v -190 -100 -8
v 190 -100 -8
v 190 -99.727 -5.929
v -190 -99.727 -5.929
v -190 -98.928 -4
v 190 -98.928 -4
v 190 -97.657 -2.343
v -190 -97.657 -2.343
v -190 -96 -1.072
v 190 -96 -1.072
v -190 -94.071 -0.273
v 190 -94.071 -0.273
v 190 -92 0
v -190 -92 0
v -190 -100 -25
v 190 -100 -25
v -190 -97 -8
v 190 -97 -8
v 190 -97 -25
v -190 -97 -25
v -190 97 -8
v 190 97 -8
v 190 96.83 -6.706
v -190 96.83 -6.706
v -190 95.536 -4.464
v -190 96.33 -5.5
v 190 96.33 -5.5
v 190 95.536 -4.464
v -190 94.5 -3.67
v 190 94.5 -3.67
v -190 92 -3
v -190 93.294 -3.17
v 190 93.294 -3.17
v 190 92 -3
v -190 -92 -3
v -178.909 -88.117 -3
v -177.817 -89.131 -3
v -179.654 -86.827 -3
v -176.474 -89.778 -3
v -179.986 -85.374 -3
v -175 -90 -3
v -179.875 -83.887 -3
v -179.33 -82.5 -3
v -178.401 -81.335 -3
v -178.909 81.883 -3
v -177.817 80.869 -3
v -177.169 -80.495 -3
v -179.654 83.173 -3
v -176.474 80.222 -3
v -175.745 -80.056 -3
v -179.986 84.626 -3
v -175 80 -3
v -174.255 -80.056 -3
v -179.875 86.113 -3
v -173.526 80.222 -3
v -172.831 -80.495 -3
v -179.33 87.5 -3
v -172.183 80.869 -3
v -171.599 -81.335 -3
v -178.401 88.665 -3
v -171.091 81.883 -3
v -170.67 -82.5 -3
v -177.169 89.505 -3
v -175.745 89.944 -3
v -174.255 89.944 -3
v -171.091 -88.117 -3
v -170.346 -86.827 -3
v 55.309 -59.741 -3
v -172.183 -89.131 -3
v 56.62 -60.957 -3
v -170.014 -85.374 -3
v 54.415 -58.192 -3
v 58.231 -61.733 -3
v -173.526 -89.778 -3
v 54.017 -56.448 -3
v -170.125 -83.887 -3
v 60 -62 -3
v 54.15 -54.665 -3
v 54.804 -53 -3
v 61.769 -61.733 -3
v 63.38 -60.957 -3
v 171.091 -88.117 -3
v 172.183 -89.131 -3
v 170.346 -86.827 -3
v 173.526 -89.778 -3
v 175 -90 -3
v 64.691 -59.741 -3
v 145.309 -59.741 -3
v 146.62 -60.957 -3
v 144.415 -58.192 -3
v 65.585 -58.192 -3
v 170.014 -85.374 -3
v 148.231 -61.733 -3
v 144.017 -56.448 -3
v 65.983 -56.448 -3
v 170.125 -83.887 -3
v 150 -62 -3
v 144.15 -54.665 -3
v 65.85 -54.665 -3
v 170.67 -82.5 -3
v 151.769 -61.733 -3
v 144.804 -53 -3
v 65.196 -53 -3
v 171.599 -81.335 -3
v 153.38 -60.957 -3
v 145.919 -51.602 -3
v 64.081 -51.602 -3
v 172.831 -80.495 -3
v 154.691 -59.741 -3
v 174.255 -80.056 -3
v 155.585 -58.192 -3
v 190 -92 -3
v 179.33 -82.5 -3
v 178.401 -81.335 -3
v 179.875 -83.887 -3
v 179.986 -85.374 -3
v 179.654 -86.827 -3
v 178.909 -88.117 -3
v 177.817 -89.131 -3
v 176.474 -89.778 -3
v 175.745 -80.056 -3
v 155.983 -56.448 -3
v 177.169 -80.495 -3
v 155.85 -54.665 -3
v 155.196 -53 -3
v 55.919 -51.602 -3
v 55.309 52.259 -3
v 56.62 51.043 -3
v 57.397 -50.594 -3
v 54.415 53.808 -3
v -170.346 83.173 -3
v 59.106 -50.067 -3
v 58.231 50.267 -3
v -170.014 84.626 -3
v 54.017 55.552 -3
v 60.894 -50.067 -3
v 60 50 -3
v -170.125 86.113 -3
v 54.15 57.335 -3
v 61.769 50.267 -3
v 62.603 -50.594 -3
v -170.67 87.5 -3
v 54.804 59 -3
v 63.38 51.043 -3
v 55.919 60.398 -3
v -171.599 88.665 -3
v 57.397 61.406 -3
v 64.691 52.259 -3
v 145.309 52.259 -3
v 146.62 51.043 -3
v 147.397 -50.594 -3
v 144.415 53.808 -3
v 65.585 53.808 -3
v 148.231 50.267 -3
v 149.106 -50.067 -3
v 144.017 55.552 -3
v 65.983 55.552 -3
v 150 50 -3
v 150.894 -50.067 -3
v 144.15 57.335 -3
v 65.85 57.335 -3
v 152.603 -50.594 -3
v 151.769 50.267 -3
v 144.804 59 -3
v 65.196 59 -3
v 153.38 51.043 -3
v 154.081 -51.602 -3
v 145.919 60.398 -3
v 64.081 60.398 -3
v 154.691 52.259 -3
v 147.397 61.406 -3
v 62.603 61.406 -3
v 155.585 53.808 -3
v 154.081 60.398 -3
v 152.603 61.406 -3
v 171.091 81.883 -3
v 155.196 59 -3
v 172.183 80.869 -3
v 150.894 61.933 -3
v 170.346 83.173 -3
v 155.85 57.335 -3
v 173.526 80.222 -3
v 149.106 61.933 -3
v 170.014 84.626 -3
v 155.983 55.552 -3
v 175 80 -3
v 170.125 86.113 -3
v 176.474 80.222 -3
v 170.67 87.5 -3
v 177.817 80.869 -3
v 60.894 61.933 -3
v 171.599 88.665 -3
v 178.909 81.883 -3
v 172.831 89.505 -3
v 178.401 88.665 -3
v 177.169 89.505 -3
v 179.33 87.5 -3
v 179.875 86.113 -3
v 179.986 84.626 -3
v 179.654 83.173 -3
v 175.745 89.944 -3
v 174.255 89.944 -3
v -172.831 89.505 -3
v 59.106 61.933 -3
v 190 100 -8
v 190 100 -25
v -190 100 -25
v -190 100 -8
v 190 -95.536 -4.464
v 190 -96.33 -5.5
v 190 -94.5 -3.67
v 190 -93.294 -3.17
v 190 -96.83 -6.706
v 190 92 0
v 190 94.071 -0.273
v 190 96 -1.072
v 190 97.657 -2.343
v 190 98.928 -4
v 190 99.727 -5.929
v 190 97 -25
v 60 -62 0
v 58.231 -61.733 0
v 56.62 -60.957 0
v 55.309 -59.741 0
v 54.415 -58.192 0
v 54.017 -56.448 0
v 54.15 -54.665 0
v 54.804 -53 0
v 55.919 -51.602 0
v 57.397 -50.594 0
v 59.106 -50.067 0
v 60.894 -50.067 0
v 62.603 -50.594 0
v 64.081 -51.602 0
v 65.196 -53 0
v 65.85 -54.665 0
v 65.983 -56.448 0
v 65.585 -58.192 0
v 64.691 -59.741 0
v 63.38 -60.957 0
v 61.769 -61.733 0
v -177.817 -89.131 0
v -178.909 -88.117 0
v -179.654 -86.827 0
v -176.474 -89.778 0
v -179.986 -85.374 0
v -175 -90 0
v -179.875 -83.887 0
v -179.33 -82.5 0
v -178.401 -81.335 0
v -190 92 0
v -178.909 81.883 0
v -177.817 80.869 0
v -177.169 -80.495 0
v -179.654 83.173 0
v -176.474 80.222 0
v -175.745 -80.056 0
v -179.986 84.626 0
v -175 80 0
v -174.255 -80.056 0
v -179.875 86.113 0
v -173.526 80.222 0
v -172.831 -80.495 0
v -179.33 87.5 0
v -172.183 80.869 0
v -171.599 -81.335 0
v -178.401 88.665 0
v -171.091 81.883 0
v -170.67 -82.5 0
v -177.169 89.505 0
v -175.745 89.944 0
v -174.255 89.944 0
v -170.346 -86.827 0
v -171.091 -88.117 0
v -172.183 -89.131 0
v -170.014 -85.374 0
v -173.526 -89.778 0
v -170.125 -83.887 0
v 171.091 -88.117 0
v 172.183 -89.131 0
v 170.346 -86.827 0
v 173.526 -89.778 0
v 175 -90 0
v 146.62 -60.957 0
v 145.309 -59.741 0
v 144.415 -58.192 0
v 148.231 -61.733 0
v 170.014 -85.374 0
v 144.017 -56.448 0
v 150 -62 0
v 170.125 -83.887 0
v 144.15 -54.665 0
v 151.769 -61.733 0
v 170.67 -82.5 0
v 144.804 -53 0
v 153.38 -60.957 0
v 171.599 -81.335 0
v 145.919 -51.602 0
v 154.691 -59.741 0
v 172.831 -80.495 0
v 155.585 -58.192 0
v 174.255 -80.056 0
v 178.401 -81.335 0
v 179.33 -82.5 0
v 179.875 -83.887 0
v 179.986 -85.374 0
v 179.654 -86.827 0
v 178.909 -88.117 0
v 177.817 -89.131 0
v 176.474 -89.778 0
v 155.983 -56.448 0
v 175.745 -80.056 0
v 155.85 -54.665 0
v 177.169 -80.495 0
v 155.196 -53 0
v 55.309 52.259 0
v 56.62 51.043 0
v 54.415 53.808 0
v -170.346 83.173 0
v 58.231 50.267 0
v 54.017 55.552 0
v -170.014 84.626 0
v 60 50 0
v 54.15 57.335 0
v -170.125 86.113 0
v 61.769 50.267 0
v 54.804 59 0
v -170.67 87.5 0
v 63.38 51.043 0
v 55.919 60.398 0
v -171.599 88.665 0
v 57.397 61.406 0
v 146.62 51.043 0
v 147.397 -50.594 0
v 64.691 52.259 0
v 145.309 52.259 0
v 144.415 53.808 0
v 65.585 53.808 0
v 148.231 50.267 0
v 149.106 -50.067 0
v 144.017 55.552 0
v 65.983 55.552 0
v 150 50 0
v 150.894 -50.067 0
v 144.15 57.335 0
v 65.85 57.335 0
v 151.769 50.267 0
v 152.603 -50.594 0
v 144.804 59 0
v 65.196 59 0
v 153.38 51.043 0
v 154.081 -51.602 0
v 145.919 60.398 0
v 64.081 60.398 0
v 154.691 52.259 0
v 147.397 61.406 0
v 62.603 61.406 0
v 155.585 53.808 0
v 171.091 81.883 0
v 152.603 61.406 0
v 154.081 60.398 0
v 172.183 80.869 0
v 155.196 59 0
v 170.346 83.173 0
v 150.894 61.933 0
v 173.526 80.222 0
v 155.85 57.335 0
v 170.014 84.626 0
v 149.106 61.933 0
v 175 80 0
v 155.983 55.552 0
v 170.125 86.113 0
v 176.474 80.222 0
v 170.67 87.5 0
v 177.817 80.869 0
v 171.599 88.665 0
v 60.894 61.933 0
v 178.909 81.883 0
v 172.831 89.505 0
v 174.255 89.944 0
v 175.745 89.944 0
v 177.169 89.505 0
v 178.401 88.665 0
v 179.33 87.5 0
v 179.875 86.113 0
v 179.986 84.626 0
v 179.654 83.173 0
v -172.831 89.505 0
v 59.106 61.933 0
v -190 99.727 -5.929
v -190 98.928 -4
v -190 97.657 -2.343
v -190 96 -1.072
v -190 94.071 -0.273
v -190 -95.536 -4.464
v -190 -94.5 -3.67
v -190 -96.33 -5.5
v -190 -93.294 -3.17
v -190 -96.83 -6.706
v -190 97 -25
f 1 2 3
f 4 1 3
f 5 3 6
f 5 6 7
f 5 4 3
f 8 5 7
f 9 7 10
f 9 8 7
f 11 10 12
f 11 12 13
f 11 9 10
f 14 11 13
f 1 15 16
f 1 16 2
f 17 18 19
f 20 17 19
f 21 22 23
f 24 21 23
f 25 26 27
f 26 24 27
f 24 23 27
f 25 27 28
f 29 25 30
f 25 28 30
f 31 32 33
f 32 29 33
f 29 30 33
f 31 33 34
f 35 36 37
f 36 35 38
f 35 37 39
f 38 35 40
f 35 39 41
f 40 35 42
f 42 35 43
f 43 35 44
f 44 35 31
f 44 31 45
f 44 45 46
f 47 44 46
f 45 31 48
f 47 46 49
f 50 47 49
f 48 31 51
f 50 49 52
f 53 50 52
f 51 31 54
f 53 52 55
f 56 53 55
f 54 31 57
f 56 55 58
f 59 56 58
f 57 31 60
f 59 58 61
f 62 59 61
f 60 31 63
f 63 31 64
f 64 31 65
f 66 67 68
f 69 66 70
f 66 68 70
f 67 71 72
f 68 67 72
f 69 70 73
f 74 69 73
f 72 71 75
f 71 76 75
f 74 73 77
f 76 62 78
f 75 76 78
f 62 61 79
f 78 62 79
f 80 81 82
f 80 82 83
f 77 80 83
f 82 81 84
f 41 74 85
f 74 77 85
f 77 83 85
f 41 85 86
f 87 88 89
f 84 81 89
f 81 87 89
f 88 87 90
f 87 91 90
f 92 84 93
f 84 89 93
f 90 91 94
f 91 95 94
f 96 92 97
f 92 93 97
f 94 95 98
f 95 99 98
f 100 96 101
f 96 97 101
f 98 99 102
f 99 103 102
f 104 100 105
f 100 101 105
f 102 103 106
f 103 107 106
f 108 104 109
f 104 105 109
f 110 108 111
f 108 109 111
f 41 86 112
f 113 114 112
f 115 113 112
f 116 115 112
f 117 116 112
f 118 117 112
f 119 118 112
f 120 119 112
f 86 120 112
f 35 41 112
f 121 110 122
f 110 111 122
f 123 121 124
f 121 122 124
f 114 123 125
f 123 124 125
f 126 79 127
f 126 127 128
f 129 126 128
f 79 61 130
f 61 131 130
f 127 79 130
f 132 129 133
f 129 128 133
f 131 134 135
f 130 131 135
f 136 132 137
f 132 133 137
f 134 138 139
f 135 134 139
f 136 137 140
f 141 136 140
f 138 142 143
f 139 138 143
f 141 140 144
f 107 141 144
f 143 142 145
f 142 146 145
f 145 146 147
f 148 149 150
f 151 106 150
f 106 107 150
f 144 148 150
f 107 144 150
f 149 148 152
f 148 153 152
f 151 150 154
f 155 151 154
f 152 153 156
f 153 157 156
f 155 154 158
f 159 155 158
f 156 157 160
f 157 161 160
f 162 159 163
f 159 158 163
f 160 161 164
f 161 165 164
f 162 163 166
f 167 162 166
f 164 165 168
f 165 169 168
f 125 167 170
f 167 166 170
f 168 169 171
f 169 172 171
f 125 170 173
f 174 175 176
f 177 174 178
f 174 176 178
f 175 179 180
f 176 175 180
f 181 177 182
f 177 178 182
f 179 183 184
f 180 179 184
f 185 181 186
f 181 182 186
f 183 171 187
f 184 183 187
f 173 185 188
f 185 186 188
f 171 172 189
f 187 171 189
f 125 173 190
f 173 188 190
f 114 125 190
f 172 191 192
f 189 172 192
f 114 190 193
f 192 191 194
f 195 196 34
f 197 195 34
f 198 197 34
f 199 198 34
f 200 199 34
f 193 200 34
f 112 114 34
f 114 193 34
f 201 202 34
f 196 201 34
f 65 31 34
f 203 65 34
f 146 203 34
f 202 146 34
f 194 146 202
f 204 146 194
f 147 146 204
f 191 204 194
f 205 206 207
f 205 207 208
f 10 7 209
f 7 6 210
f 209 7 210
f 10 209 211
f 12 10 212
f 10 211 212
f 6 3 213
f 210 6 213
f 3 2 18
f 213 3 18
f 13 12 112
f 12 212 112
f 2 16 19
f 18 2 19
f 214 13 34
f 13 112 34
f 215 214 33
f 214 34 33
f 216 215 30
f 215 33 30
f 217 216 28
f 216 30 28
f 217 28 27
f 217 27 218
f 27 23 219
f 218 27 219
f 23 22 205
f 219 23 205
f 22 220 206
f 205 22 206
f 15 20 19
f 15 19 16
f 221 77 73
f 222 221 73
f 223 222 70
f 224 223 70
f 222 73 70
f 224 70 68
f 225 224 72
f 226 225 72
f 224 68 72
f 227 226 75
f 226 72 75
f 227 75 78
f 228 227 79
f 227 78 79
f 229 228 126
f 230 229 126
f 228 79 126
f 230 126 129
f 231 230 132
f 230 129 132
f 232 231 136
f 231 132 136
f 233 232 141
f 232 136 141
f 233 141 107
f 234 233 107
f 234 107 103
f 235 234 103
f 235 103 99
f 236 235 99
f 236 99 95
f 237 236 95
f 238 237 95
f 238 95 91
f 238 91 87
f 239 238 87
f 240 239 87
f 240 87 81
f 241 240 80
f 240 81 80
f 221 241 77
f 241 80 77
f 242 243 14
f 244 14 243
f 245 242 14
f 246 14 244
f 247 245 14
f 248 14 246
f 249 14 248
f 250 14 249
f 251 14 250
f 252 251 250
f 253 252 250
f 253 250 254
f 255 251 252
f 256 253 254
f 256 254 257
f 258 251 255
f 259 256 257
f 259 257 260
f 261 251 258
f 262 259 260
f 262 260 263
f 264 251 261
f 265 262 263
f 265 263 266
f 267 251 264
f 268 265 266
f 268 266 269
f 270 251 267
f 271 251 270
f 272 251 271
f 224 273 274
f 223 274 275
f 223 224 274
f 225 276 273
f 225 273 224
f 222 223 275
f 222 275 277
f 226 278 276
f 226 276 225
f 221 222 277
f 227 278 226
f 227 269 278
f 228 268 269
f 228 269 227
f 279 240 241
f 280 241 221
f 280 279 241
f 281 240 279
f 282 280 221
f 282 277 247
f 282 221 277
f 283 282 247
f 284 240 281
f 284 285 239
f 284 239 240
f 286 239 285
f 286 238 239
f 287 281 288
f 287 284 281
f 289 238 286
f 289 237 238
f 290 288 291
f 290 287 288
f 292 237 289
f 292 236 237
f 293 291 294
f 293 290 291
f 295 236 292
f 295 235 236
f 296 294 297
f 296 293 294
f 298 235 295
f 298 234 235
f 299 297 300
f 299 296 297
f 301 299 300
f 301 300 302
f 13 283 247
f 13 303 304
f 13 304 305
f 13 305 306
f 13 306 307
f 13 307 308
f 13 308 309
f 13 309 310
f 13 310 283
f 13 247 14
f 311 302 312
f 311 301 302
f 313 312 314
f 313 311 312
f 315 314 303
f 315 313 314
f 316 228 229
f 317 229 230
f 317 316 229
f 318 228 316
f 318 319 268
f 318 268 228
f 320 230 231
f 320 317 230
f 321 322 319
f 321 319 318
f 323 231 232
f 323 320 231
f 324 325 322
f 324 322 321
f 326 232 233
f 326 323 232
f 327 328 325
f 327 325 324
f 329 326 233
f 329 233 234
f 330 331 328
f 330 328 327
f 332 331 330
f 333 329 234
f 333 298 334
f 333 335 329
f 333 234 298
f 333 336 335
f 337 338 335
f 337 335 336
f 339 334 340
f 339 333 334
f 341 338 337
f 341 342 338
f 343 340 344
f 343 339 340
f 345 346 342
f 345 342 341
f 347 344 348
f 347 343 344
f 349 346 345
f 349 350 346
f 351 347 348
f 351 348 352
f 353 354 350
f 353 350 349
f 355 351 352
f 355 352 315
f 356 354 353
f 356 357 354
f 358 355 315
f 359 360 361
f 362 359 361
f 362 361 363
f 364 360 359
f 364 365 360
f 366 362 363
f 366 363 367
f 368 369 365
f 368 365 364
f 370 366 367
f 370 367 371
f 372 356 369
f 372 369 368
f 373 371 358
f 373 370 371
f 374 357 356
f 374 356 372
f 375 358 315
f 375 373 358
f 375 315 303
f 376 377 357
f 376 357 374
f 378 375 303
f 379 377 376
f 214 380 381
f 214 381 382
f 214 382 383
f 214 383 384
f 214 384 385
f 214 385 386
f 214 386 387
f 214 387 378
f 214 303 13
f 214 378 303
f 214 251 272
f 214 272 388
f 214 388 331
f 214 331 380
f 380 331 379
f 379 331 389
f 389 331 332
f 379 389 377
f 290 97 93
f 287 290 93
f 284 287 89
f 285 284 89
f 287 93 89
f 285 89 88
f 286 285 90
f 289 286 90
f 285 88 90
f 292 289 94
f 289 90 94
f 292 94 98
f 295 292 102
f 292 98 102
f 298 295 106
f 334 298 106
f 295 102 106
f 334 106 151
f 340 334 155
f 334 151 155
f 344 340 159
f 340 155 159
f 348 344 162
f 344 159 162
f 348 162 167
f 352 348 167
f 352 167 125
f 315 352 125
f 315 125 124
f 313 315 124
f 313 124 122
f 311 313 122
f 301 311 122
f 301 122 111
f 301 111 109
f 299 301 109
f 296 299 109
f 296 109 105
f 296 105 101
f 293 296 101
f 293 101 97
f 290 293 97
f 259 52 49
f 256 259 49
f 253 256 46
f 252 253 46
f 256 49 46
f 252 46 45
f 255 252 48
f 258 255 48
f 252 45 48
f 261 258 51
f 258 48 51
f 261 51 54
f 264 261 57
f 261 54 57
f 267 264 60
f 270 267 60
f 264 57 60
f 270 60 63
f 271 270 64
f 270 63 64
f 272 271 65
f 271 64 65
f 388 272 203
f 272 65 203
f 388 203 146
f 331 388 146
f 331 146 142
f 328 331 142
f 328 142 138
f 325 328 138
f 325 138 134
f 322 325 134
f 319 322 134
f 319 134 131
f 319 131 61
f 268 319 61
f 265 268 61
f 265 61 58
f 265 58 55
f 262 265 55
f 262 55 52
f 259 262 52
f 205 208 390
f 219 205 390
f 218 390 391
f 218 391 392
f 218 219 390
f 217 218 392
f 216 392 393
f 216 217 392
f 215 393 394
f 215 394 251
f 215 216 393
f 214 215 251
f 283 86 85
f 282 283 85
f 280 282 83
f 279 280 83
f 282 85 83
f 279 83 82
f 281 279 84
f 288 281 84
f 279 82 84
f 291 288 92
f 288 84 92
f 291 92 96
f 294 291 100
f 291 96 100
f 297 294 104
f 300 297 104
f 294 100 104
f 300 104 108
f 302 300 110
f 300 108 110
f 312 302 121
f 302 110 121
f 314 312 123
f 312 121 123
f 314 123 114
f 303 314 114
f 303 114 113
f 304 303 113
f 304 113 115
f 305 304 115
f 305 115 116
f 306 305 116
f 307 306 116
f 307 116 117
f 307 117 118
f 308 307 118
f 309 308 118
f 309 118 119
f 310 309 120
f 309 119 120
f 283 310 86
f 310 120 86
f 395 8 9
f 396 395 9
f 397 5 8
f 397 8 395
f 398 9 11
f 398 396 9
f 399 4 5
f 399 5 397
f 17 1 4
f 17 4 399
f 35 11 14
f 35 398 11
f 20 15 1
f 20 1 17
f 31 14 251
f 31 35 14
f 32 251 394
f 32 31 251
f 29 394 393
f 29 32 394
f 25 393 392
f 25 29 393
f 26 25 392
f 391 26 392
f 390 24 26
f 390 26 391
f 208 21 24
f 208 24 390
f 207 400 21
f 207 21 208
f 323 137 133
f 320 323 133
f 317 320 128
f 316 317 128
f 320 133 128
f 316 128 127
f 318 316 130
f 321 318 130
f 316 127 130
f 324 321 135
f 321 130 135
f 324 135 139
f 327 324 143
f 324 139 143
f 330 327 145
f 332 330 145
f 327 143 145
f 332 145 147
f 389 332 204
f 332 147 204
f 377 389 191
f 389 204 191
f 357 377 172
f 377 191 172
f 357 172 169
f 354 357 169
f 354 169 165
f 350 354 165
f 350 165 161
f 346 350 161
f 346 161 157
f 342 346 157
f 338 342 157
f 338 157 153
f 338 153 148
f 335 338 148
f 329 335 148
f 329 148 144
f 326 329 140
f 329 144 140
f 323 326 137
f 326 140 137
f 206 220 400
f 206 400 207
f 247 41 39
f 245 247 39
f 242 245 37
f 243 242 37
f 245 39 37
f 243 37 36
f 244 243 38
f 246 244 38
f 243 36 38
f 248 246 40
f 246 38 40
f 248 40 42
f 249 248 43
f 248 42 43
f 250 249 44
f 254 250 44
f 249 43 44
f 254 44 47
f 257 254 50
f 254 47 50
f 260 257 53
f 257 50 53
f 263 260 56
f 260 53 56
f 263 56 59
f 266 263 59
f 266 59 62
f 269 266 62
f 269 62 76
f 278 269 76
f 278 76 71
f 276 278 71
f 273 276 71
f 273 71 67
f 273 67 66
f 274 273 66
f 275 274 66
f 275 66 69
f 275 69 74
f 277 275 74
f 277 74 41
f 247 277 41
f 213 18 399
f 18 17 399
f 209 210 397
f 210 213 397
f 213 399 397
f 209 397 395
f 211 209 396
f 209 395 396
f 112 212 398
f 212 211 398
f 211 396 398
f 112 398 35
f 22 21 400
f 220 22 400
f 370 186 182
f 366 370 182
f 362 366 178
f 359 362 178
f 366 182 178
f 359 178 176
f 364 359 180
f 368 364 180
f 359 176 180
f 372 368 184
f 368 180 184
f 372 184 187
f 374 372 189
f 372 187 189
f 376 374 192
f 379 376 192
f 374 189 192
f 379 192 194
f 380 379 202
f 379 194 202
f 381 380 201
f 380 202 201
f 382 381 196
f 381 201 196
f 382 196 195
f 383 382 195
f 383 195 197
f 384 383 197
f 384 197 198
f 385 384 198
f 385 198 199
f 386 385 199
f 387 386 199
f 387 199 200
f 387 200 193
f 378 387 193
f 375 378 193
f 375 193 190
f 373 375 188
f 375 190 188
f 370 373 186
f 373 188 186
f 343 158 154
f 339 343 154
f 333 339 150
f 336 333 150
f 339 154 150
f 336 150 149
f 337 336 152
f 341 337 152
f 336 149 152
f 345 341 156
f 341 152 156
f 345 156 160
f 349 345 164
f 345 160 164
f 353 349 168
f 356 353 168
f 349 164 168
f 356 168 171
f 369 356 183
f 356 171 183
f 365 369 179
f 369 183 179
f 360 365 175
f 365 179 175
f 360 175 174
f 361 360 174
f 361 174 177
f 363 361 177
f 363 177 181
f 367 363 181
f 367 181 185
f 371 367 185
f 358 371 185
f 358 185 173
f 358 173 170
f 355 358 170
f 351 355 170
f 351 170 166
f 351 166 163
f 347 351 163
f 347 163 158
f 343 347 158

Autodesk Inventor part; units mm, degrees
ref_plane "YZ Plane" through (0, 0, 0) normal (1, 0, 0) x (0, 1, 0)
ref_plane "XZ Plane" through (0, 0, 0) normal (0, 1, 0) x (-1, 0, 0)
ref_plane "XY Plane" through (0, 0, 0) normal (0, 0, 1) x (1, 0, 0)
sketch "Sketch1" plane through (0, 0, 0) normal (0, 0, 1) x (1, 0, 0)
  line L0 (-190, 100) -> (190, 100)
  line L1 (190, 100) -> (190, -100)
  line L2 (190, -100) -> (-190, -100)
  line L3 (-190, -100) -> (-190, 100)
  line L4 (-190, 100) -> (190, -100) construction
  point P0 (0, 0)
  point P1 (0, 0)
  dimension "d0" = 380
  dimension "d1" = 200
extrude "Plate1" add sketch "Sketch1" against normal blind 3
sketch "Sketch2" plane through (0, 0, 0) normal (0, 0, 1) x (1, 0, 0)
  line L0 (60, 56) -> (150, 56) construction
  line L1 (150, 56) -> (150, -56) construction
  line L2 (150, -56) -> (60, -56) construction
  line L3 (60, -56) -> (60, 56) construction
  line L4 (190, -100) -> (190, 100) projected
  point P0 (0, 0)
  point P1 (60, 0)
  dimension "d3" = 90
  dimension "d4" = 112
  dimension "d5" = 40
hole "Hole1" at (60, 56, 0) at (150, 56, 0) at (60, -56, 0) at (150, -56, 0) direction (0, 0, -1) diameter 12 end through all
sketch "Sketch3" plane through (0, 0, 0) normal (0, 0, 1) x (1, 0, 0)
  line L0 (-175, 85) -> (175, 85) construction
  line L1 (175, 85) -> (175, -85) construction
  line L2 (175, -85) -> (-175, -85) construction
  line L3 (-175, -85) -> (-175, 85) construction
  line L4 (-175, 85) -> (175, -85) construction
  point P0 (0, 0)
  point P1 (0, 0)
  dimension "d14" = 170
  dimension "d15" = 350
hole "Hole2" at (-175, 85, 0) at (175, 85, 0) at (175, -85, 0) at (-175, -85, 0) direction (0, 0, -1) diameter 10 end through all
sketch "Sketch4" plane through (-190, -97, 0) normal (0, -1, 0) x (1, 0, 0)
  line L0 (380, 0) -> (0, 0)
  line L1 (0, 0) -> (0, -25)
  line L2 (0, -25) -> (380, -25)
  line L3 (380, -25) -> (380, 0)
edge flange "Flange1" height 25 angle 90 thickness 3 bend radius 5 thickness toward (0, -1, 0) relief round relief width 3 relief depth 1.5 corner gap 5 corner form 0 edges at (0, -100, -3) (0, 100, -3) wall of the first edge with corners at (190, -97, 0) (-190, -97, 0) (-190, -97, -25) (190, -97, -25)
bend "Bend1"
corner "Corner1"
equation "\"d11\" = Thickness"
equation "\"d2\" = Thickness"
equation "\"d23\" = BendReliefWidth"
equation "\"d24\" = BendReliefDepth"
equation "\"d25\" = MinimumRemnant"
equation "\"d26\" = TransitionRadius"
equation "\"d29\" = BendRadius"
equation "\"d30\" = CornerReliefSize"
equation "\"d31\" = GapSize"
equation "\"d32\" = JacobiRadiusSize"
equation "\"BendReliefWidth\" = Thickness"
equation "\"BendReliefDepth\" = 0.5 * Thickness"
equation "\"CornerReliefSize\" = 4 * Thickness"
equation "\"MinimumRemnant\" = 2 * Thickness"
equation "\"TransitionRadius\" = BendRadius"
equation "\"JacobiRadiusSize\" = BendRadius"
equation "\"GapSize\" = Thickness"
equation "\"Thickness\" = 3"
equation "\"BendRadius\" = 5"
properties part number "BURUN plate" material "Stainless Steel"
